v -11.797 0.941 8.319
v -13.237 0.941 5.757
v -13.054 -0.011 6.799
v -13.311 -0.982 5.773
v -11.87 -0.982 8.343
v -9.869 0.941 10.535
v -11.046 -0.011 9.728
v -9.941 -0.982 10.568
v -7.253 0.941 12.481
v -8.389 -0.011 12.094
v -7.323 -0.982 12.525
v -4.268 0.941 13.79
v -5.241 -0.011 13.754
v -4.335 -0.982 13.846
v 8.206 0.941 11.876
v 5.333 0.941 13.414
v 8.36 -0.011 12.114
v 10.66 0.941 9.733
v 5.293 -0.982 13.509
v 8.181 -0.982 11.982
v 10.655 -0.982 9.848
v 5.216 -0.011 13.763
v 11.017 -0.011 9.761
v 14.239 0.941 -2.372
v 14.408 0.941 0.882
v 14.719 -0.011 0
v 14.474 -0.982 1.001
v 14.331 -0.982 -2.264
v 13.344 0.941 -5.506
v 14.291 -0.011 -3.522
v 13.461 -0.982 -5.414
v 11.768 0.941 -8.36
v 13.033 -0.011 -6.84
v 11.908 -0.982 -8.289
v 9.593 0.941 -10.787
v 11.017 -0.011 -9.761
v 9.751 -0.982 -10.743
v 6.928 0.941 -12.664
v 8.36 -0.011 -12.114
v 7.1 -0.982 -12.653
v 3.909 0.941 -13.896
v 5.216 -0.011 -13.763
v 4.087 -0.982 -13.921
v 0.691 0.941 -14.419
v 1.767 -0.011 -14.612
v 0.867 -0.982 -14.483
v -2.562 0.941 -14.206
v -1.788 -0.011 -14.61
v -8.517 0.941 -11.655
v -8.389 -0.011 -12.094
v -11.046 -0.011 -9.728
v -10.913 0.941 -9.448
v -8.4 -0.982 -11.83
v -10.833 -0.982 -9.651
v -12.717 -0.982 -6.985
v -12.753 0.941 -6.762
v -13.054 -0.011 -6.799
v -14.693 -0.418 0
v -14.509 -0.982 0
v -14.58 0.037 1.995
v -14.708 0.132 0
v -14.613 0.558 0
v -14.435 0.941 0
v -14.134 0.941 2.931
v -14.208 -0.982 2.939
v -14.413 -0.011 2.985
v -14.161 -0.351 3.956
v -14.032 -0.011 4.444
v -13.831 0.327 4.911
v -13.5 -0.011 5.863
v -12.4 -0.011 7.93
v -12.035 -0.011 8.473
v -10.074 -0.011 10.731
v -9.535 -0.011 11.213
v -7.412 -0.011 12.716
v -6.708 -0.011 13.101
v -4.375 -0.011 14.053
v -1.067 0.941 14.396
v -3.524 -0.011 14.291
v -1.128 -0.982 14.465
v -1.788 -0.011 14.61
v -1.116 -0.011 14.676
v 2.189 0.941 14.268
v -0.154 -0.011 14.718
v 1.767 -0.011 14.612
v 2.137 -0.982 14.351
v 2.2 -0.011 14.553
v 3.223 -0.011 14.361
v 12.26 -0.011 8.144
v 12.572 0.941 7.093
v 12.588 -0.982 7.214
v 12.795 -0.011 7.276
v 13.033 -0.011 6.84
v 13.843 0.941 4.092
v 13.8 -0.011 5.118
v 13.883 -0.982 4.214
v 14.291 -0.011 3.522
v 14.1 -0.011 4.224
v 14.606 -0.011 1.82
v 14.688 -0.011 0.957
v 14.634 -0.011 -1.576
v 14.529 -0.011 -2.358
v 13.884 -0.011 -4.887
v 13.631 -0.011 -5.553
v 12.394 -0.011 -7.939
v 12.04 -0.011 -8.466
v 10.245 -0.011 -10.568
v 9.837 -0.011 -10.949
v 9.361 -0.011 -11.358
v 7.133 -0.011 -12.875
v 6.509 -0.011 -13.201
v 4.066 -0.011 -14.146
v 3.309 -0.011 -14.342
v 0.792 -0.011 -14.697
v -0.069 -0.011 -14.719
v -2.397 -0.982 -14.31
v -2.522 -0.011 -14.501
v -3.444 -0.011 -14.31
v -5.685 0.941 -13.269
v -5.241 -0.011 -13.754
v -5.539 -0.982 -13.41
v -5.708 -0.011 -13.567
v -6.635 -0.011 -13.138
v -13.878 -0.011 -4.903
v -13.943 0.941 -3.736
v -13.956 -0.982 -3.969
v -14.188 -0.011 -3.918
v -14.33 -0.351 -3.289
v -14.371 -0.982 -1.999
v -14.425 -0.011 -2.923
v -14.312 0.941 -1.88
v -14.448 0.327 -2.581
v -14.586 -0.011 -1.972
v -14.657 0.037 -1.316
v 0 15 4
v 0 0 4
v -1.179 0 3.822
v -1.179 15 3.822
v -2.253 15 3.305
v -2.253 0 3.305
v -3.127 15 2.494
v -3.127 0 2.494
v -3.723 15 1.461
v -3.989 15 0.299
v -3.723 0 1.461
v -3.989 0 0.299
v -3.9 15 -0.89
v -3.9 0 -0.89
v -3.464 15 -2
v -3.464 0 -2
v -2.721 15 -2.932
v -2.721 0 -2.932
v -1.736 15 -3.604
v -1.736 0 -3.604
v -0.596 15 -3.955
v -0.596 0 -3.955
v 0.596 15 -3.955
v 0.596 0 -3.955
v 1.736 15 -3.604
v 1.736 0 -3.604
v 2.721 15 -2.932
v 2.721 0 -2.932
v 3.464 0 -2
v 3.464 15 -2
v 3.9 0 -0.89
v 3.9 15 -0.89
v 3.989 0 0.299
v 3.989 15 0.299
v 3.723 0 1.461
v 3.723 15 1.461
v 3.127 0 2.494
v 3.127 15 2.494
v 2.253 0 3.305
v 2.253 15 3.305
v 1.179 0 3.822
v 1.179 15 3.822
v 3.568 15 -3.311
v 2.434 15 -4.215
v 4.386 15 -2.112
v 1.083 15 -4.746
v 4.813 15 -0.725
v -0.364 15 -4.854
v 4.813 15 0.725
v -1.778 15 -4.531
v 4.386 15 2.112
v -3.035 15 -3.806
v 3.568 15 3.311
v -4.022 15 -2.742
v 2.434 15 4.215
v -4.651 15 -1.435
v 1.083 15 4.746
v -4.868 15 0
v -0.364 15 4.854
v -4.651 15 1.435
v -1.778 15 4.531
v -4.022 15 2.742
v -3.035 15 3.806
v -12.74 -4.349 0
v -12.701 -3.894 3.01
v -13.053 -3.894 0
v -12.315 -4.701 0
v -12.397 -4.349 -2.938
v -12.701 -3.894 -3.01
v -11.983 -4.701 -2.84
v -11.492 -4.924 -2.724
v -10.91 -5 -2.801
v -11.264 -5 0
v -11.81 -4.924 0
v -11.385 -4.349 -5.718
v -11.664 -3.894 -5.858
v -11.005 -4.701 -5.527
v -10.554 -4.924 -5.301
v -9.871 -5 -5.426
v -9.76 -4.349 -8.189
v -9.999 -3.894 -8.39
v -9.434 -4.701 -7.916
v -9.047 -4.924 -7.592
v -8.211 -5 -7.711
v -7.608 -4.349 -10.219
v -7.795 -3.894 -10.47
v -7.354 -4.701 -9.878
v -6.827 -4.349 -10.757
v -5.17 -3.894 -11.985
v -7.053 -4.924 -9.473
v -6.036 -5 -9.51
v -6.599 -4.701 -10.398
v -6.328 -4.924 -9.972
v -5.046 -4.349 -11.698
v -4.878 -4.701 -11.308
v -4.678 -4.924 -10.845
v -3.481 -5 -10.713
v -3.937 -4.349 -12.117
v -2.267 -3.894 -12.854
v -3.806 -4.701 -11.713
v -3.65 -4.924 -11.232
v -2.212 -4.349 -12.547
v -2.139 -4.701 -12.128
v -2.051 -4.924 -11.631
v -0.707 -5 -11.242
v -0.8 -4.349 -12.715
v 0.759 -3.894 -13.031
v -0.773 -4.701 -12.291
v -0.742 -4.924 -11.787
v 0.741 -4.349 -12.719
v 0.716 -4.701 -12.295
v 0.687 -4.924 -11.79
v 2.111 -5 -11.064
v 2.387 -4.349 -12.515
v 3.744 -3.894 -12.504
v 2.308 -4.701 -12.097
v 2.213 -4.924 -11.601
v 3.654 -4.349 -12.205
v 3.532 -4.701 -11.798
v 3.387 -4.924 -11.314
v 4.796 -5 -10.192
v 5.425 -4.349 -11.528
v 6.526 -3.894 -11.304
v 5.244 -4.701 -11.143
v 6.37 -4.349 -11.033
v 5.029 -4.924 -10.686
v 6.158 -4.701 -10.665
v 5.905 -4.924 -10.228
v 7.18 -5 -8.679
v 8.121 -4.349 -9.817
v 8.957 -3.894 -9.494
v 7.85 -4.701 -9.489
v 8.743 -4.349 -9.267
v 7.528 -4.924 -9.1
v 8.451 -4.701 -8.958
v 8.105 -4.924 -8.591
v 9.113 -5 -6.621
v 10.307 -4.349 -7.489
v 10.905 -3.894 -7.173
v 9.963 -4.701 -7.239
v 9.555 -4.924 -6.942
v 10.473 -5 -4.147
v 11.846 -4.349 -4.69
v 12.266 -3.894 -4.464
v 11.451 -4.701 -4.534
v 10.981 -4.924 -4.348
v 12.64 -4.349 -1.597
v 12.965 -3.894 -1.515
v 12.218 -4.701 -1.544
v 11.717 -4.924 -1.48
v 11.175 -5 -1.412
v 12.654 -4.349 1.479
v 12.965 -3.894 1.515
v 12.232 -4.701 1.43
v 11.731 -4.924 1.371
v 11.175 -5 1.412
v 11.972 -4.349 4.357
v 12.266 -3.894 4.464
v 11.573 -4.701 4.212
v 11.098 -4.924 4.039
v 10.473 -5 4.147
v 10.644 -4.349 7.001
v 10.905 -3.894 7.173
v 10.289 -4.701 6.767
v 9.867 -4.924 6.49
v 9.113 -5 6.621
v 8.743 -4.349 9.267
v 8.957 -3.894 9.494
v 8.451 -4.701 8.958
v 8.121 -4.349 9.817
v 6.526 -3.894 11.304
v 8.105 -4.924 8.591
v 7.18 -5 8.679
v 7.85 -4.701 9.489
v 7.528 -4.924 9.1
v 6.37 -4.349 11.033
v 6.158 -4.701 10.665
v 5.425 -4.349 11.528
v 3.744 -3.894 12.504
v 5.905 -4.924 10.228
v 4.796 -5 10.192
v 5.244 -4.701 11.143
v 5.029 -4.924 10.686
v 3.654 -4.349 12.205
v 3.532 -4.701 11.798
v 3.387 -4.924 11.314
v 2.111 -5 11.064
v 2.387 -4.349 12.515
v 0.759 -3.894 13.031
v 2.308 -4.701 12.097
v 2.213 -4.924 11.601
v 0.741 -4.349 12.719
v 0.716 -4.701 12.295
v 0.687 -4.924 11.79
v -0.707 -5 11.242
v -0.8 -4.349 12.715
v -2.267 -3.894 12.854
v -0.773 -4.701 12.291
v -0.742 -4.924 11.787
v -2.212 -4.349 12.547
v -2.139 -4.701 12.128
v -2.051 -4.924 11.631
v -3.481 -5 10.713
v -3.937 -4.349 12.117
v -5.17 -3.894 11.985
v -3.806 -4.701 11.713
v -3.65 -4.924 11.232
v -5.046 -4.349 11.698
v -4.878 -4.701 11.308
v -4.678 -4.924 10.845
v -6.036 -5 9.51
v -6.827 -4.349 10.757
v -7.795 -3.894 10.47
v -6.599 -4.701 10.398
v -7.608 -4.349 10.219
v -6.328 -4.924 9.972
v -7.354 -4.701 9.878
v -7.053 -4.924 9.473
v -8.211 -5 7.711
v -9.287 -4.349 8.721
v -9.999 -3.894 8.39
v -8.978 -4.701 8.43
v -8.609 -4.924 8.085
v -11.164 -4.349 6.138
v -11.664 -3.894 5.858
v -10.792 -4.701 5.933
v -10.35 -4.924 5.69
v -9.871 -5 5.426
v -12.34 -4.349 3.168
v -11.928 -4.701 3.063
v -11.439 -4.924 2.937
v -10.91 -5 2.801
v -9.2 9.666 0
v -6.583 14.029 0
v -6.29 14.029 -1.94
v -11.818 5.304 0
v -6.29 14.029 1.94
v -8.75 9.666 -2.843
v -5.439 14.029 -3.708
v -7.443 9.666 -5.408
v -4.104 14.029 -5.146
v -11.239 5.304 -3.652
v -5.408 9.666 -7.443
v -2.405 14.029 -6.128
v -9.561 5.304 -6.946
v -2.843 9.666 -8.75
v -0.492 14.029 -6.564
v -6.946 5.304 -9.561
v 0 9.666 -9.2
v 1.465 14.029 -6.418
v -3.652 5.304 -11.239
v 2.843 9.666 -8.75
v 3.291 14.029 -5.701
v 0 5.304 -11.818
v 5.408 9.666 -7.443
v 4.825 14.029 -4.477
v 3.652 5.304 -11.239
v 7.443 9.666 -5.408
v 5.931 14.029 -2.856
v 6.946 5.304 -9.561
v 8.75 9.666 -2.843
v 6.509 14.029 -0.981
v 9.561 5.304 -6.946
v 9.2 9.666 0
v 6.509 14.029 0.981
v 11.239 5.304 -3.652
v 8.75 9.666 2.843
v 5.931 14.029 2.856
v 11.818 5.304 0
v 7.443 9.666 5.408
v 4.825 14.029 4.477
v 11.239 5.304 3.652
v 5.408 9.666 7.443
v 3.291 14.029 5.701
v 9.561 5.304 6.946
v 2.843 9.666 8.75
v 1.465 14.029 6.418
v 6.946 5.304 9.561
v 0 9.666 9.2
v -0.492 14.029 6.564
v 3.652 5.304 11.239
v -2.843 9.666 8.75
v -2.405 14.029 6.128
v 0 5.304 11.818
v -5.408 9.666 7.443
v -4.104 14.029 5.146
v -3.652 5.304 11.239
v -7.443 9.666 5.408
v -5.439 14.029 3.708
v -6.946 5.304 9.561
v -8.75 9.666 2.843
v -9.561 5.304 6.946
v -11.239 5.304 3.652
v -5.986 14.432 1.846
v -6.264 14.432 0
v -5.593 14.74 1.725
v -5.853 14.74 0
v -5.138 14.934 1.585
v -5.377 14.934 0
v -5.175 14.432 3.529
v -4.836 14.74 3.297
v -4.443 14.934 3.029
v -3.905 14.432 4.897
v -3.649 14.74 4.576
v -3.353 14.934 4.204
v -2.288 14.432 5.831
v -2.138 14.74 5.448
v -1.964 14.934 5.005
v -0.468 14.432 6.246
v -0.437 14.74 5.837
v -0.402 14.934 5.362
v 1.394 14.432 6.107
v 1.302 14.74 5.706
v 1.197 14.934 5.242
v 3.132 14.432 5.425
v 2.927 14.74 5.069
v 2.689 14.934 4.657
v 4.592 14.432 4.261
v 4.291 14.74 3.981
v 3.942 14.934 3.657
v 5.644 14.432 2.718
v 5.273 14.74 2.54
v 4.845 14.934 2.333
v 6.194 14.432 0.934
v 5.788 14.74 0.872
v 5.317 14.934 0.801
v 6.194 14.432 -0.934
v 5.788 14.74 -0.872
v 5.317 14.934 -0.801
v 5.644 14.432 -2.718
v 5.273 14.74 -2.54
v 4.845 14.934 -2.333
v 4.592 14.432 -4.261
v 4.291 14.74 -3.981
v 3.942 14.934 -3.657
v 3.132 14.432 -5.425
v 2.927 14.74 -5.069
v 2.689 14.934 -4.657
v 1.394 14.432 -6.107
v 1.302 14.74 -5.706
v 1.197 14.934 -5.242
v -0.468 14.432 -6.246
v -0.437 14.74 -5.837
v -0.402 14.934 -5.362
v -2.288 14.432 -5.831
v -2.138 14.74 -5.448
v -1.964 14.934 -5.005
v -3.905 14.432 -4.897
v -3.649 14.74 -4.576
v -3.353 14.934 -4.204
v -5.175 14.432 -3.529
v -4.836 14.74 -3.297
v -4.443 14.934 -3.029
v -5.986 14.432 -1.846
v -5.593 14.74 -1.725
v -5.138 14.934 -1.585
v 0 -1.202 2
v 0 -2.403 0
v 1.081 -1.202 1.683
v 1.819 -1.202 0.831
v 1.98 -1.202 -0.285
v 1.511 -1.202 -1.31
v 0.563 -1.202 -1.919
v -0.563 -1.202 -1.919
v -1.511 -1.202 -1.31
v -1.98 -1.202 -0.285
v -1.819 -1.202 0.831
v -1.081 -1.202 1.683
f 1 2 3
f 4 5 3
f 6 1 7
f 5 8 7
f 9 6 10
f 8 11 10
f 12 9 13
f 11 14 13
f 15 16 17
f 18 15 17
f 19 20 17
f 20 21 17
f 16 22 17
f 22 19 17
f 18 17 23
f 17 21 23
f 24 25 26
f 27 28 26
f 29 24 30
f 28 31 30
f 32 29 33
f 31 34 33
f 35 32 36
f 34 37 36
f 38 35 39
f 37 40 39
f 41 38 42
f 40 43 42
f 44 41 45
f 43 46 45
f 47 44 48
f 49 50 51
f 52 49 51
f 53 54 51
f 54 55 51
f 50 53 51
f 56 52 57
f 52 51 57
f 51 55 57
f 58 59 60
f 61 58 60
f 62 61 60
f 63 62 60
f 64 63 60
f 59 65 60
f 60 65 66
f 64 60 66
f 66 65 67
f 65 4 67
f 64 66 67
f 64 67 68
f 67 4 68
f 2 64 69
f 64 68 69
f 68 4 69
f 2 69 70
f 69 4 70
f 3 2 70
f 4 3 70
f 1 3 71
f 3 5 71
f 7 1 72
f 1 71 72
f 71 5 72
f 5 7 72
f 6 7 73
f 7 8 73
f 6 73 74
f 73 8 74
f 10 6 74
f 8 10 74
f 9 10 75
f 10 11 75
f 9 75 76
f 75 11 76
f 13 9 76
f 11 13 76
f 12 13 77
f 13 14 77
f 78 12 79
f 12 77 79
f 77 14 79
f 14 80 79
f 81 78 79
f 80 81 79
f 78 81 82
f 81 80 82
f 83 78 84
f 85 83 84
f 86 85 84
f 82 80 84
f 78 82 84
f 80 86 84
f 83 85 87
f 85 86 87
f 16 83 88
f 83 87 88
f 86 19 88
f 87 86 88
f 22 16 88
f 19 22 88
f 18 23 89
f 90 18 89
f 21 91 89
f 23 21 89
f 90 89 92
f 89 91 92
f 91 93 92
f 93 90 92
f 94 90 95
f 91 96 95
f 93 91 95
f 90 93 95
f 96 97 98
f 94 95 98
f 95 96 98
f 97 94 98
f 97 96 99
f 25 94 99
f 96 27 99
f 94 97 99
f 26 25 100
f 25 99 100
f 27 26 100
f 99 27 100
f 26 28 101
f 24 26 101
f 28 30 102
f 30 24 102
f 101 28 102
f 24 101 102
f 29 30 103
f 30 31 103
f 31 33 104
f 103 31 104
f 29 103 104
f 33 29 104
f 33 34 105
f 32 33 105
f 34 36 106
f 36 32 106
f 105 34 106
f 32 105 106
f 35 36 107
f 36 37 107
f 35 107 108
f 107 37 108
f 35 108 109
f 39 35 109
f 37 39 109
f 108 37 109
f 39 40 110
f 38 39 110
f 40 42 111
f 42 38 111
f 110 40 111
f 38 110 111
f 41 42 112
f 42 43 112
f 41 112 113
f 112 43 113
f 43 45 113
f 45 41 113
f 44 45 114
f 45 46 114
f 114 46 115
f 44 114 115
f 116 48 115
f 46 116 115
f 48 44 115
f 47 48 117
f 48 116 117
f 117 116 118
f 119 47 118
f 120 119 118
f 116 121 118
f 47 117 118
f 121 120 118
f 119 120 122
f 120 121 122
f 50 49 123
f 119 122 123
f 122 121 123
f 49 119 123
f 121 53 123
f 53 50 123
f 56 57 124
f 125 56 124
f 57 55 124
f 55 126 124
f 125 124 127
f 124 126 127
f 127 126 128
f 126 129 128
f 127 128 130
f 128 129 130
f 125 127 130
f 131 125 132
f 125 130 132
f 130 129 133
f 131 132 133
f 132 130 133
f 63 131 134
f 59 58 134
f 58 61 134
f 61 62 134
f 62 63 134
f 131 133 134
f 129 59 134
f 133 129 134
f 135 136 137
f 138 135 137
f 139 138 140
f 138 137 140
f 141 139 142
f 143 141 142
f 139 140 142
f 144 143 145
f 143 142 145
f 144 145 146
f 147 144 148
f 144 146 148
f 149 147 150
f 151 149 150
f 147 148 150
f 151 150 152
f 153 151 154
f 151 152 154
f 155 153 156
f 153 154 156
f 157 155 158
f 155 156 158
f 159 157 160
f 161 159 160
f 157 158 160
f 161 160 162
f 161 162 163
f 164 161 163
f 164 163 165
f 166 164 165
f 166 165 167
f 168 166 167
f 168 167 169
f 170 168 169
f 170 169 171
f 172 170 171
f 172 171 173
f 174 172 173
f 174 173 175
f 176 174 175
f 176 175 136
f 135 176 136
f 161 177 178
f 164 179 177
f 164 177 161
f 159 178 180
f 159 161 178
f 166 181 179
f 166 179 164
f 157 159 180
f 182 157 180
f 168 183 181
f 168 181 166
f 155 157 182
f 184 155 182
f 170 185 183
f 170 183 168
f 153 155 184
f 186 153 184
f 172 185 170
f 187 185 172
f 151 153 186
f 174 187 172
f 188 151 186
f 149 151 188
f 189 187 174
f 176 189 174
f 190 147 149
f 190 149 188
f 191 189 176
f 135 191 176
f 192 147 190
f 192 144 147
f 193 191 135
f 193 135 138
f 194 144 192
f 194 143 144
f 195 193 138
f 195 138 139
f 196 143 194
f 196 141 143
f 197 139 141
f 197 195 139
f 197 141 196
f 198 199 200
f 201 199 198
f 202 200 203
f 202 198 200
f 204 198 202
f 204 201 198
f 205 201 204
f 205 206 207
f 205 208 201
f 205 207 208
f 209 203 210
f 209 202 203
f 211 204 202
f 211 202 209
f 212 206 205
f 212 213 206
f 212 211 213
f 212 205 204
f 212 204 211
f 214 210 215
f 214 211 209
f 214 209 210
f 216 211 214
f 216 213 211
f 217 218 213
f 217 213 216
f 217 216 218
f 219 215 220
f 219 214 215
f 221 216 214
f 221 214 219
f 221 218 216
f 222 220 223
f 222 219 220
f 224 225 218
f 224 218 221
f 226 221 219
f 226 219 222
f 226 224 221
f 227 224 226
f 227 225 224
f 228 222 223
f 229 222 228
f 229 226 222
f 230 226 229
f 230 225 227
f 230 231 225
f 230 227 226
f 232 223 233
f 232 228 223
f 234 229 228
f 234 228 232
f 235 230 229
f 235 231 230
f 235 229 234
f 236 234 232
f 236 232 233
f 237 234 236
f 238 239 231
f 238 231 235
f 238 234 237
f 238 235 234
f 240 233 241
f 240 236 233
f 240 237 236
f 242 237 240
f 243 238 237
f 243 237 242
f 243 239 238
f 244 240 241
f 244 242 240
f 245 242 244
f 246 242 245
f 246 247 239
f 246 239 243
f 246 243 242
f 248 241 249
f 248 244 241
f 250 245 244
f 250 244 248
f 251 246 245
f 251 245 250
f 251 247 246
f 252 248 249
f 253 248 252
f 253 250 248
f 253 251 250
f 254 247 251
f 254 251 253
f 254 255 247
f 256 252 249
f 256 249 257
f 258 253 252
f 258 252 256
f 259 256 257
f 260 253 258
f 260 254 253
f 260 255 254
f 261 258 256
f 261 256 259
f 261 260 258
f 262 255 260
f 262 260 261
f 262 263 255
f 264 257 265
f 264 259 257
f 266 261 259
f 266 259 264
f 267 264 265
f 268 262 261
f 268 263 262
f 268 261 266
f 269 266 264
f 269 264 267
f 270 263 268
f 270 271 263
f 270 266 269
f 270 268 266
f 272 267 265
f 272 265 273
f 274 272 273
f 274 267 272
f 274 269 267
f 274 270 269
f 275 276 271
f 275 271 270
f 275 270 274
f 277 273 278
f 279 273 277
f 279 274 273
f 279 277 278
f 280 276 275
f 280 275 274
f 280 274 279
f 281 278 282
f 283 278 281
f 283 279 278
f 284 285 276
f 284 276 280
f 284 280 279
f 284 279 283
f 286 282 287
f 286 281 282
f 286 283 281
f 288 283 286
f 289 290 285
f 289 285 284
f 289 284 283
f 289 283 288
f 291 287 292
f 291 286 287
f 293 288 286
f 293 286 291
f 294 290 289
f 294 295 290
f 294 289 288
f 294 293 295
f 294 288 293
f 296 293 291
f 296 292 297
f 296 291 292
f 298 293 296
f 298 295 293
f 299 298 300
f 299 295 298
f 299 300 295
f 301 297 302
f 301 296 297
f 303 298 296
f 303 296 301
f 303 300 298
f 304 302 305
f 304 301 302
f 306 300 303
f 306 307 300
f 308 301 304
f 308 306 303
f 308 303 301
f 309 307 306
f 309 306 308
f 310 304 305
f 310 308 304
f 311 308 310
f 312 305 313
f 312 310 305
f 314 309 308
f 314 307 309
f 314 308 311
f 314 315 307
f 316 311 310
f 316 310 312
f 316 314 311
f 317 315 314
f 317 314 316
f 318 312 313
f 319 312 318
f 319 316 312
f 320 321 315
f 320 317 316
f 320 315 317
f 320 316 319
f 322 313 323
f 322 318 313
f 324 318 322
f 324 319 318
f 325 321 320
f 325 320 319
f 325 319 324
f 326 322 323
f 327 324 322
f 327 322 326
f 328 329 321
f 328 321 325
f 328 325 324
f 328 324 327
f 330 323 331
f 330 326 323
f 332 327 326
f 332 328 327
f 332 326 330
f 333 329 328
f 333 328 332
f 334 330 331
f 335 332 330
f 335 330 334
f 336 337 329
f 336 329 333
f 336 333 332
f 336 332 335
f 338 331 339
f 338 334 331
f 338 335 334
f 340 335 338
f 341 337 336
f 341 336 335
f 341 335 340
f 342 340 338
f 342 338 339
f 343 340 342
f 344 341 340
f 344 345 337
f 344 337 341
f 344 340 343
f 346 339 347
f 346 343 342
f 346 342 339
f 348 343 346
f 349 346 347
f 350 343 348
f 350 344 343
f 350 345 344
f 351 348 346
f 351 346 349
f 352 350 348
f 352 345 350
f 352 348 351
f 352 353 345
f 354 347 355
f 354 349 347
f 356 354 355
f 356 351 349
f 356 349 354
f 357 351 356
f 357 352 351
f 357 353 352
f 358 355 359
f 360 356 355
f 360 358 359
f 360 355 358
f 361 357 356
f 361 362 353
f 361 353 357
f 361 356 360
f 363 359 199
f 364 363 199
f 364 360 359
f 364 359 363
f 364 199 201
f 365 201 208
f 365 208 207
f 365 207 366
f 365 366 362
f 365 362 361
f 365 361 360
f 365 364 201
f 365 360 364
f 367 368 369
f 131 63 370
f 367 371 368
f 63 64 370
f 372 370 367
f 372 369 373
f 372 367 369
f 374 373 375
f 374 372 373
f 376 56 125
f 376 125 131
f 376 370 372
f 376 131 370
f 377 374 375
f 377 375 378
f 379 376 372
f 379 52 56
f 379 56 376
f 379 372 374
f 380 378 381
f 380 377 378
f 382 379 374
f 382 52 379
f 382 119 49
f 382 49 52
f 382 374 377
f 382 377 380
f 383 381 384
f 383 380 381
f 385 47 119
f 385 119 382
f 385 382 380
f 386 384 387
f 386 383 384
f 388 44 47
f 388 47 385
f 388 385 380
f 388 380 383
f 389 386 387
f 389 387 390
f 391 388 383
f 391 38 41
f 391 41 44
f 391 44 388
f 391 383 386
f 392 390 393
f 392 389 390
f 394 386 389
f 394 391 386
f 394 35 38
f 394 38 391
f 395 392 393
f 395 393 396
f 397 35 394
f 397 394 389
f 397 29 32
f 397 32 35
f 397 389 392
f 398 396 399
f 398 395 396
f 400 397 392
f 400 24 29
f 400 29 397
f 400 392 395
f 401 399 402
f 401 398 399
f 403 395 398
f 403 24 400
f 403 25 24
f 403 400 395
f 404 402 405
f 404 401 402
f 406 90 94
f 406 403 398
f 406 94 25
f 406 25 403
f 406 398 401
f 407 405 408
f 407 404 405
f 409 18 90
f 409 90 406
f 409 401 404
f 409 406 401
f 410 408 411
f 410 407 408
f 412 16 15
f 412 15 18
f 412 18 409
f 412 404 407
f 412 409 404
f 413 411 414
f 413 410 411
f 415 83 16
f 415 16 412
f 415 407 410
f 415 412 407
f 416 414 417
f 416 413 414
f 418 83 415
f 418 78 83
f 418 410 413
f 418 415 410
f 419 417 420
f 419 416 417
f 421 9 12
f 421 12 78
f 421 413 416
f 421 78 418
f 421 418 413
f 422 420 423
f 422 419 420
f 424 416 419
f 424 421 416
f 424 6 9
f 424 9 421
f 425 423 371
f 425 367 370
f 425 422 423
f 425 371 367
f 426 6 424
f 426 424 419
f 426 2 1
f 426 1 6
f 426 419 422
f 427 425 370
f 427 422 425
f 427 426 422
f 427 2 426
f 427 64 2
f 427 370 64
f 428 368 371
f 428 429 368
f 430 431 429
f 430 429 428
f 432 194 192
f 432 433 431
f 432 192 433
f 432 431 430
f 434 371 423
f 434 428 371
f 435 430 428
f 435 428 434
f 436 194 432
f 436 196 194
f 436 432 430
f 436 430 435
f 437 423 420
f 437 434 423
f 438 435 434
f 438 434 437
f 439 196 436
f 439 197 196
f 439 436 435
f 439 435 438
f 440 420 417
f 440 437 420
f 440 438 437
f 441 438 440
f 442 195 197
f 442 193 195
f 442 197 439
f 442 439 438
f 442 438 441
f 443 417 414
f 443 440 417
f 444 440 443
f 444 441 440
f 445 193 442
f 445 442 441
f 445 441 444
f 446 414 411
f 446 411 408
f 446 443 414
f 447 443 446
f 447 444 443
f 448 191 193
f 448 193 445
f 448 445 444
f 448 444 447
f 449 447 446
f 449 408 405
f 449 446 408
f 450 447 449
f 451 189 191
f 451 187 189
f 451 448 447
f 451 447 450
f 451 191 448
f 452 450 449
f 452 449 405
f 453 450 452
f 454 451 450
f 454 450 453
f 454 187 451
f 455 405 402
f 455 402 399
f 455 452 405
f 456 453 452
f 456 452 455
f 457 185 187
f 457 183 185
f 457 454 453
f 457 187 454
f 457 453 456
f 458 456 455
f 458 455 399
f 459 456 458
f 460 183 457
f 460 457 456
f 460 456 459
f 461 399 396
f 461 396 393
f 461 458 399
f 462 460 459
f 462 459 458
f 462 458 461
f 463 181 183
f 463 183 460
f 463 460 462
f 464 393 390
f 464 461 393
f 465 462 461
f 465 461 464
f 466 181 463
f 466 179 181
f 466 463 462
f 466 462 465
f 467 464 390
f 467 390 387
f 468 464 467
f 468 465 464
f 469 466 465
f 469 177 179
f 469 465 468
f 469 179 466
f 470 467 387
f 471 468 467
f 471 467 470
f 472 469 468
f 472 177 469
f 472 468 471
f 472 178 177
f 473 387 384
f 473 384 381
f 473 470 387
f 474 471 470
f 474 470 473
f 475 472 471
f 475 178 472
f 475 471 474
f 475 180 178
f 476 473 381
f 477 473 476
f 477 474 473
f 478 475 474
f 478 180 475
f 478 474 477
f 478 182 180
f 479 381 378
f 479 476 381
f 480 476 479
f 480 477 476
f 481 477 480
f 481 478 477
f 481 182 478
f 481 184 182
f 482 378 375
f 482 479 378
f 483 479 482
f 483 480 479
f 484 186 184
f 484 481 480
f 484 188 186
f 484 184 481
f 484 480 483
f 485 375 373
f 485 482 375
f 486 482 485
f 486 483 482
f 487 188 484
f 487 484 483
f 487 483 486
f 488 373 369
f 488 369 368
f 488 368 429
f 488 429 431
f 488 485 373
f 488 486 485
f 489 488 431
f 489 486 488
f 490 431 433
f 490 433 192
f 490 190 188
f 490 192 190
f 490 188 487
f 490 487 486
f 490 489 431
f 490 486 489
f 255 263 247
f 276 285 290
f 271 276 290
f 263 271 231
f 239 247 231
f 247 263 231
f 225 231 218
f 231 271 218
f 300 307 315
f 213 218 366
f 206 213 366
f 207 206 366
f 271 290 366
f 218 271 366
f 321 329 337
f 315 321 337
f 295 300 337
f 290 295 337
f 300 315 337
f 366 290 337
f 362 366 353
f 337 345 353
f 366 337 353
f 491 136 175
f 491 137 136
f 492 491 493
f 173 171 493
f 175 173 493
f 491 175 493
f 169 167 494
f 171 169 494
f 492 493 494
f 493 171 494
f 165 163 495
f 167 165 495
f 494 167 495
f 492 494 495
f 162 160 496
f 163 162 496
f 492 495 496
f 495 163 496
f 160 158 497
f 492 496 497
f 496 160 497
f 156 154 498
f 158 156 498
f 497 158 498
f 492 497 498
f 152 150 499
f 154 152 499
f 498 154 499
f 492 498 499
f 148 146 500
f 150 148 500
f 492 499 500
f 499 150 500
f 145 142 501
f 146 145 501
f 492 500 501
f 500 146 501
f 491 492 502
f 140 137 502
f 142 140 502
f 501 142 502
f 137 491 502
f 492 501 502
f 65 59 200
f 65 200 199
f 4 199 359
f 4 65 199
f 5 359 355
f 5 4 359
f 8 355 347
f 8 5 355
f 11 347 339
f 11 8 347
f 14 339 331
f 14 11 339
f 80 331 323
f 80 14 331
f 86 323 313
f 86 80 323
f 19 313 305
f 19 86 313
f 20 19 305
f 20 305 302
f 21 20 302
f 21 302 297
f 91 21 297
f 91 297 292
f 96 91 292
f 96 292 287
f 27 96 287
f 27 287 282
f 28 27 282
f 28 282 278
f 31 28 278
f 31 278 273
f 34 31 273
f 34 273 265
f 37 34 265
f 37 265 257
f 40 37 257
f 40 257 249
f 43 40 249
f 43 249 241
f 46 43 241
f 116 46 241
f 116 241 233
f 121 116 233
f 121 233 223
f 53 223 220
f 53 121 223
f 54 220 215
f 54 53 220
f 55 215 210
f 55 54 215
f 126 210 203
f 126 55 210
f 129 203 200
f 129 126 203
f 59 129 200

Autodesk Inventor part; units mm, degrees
ref_plane "YZ Plane" through (0, 0, 0) normal (1, 0, 0) x (0, 1, 0)
sketch "Sketch1" plane through (0, 0, 0) normal (0, 1, 0) x (-1, 0, 0)
  circle A0 centre (0, 0) radius 15
  dimension "d0" = 30
ref_plane "Work Plane1" through (0, 15, 0) normal (0, 1, 0) x (-1, 0, 0)
sketch "Sketch2" plane through (0, 15, 0) normal (0, 1, 0) x (-1, 0, 0)
  circle A0 centre (0, 0) radius 6
  dimension "d2" = 12
loft "Loft1" add profiles "Sketch1", "Sketch2"
ref_plane "Work Plane2" through (0, -5, 0) normal (0, 1, 0) x (-1, 0, 0)
sketch "Sketch3" plane through (0, -5, 0) normal (0, 1, 0) x (-1, 0, 0)
  circle A0 centre (0, 0) radius 12.5
  dimension "d8" = 25
loft "Loft2" add profiles "Sketch3" section 1 edges at (15, 0, 0)
fillet "Fillet1" radius 2 3 edges at (15, 0, 0) (12.5, -5, 0) (6, 15, 0)
sketch "Sketch4" plane through (0, 15, 0) normal (0, 1, 0) x (1, 0, 0)
  point P0 (0, 0)
  point P1 (0, 0)
hole "Hole1" at (0, 15, 0) direction (0, -1, 0) diameter 8 depth 15 tip angle 118
thread "Thread1" size "M8x1.25" class "6H" standard "ANSI Metric M Profile" full length
properties part number "Foot"
